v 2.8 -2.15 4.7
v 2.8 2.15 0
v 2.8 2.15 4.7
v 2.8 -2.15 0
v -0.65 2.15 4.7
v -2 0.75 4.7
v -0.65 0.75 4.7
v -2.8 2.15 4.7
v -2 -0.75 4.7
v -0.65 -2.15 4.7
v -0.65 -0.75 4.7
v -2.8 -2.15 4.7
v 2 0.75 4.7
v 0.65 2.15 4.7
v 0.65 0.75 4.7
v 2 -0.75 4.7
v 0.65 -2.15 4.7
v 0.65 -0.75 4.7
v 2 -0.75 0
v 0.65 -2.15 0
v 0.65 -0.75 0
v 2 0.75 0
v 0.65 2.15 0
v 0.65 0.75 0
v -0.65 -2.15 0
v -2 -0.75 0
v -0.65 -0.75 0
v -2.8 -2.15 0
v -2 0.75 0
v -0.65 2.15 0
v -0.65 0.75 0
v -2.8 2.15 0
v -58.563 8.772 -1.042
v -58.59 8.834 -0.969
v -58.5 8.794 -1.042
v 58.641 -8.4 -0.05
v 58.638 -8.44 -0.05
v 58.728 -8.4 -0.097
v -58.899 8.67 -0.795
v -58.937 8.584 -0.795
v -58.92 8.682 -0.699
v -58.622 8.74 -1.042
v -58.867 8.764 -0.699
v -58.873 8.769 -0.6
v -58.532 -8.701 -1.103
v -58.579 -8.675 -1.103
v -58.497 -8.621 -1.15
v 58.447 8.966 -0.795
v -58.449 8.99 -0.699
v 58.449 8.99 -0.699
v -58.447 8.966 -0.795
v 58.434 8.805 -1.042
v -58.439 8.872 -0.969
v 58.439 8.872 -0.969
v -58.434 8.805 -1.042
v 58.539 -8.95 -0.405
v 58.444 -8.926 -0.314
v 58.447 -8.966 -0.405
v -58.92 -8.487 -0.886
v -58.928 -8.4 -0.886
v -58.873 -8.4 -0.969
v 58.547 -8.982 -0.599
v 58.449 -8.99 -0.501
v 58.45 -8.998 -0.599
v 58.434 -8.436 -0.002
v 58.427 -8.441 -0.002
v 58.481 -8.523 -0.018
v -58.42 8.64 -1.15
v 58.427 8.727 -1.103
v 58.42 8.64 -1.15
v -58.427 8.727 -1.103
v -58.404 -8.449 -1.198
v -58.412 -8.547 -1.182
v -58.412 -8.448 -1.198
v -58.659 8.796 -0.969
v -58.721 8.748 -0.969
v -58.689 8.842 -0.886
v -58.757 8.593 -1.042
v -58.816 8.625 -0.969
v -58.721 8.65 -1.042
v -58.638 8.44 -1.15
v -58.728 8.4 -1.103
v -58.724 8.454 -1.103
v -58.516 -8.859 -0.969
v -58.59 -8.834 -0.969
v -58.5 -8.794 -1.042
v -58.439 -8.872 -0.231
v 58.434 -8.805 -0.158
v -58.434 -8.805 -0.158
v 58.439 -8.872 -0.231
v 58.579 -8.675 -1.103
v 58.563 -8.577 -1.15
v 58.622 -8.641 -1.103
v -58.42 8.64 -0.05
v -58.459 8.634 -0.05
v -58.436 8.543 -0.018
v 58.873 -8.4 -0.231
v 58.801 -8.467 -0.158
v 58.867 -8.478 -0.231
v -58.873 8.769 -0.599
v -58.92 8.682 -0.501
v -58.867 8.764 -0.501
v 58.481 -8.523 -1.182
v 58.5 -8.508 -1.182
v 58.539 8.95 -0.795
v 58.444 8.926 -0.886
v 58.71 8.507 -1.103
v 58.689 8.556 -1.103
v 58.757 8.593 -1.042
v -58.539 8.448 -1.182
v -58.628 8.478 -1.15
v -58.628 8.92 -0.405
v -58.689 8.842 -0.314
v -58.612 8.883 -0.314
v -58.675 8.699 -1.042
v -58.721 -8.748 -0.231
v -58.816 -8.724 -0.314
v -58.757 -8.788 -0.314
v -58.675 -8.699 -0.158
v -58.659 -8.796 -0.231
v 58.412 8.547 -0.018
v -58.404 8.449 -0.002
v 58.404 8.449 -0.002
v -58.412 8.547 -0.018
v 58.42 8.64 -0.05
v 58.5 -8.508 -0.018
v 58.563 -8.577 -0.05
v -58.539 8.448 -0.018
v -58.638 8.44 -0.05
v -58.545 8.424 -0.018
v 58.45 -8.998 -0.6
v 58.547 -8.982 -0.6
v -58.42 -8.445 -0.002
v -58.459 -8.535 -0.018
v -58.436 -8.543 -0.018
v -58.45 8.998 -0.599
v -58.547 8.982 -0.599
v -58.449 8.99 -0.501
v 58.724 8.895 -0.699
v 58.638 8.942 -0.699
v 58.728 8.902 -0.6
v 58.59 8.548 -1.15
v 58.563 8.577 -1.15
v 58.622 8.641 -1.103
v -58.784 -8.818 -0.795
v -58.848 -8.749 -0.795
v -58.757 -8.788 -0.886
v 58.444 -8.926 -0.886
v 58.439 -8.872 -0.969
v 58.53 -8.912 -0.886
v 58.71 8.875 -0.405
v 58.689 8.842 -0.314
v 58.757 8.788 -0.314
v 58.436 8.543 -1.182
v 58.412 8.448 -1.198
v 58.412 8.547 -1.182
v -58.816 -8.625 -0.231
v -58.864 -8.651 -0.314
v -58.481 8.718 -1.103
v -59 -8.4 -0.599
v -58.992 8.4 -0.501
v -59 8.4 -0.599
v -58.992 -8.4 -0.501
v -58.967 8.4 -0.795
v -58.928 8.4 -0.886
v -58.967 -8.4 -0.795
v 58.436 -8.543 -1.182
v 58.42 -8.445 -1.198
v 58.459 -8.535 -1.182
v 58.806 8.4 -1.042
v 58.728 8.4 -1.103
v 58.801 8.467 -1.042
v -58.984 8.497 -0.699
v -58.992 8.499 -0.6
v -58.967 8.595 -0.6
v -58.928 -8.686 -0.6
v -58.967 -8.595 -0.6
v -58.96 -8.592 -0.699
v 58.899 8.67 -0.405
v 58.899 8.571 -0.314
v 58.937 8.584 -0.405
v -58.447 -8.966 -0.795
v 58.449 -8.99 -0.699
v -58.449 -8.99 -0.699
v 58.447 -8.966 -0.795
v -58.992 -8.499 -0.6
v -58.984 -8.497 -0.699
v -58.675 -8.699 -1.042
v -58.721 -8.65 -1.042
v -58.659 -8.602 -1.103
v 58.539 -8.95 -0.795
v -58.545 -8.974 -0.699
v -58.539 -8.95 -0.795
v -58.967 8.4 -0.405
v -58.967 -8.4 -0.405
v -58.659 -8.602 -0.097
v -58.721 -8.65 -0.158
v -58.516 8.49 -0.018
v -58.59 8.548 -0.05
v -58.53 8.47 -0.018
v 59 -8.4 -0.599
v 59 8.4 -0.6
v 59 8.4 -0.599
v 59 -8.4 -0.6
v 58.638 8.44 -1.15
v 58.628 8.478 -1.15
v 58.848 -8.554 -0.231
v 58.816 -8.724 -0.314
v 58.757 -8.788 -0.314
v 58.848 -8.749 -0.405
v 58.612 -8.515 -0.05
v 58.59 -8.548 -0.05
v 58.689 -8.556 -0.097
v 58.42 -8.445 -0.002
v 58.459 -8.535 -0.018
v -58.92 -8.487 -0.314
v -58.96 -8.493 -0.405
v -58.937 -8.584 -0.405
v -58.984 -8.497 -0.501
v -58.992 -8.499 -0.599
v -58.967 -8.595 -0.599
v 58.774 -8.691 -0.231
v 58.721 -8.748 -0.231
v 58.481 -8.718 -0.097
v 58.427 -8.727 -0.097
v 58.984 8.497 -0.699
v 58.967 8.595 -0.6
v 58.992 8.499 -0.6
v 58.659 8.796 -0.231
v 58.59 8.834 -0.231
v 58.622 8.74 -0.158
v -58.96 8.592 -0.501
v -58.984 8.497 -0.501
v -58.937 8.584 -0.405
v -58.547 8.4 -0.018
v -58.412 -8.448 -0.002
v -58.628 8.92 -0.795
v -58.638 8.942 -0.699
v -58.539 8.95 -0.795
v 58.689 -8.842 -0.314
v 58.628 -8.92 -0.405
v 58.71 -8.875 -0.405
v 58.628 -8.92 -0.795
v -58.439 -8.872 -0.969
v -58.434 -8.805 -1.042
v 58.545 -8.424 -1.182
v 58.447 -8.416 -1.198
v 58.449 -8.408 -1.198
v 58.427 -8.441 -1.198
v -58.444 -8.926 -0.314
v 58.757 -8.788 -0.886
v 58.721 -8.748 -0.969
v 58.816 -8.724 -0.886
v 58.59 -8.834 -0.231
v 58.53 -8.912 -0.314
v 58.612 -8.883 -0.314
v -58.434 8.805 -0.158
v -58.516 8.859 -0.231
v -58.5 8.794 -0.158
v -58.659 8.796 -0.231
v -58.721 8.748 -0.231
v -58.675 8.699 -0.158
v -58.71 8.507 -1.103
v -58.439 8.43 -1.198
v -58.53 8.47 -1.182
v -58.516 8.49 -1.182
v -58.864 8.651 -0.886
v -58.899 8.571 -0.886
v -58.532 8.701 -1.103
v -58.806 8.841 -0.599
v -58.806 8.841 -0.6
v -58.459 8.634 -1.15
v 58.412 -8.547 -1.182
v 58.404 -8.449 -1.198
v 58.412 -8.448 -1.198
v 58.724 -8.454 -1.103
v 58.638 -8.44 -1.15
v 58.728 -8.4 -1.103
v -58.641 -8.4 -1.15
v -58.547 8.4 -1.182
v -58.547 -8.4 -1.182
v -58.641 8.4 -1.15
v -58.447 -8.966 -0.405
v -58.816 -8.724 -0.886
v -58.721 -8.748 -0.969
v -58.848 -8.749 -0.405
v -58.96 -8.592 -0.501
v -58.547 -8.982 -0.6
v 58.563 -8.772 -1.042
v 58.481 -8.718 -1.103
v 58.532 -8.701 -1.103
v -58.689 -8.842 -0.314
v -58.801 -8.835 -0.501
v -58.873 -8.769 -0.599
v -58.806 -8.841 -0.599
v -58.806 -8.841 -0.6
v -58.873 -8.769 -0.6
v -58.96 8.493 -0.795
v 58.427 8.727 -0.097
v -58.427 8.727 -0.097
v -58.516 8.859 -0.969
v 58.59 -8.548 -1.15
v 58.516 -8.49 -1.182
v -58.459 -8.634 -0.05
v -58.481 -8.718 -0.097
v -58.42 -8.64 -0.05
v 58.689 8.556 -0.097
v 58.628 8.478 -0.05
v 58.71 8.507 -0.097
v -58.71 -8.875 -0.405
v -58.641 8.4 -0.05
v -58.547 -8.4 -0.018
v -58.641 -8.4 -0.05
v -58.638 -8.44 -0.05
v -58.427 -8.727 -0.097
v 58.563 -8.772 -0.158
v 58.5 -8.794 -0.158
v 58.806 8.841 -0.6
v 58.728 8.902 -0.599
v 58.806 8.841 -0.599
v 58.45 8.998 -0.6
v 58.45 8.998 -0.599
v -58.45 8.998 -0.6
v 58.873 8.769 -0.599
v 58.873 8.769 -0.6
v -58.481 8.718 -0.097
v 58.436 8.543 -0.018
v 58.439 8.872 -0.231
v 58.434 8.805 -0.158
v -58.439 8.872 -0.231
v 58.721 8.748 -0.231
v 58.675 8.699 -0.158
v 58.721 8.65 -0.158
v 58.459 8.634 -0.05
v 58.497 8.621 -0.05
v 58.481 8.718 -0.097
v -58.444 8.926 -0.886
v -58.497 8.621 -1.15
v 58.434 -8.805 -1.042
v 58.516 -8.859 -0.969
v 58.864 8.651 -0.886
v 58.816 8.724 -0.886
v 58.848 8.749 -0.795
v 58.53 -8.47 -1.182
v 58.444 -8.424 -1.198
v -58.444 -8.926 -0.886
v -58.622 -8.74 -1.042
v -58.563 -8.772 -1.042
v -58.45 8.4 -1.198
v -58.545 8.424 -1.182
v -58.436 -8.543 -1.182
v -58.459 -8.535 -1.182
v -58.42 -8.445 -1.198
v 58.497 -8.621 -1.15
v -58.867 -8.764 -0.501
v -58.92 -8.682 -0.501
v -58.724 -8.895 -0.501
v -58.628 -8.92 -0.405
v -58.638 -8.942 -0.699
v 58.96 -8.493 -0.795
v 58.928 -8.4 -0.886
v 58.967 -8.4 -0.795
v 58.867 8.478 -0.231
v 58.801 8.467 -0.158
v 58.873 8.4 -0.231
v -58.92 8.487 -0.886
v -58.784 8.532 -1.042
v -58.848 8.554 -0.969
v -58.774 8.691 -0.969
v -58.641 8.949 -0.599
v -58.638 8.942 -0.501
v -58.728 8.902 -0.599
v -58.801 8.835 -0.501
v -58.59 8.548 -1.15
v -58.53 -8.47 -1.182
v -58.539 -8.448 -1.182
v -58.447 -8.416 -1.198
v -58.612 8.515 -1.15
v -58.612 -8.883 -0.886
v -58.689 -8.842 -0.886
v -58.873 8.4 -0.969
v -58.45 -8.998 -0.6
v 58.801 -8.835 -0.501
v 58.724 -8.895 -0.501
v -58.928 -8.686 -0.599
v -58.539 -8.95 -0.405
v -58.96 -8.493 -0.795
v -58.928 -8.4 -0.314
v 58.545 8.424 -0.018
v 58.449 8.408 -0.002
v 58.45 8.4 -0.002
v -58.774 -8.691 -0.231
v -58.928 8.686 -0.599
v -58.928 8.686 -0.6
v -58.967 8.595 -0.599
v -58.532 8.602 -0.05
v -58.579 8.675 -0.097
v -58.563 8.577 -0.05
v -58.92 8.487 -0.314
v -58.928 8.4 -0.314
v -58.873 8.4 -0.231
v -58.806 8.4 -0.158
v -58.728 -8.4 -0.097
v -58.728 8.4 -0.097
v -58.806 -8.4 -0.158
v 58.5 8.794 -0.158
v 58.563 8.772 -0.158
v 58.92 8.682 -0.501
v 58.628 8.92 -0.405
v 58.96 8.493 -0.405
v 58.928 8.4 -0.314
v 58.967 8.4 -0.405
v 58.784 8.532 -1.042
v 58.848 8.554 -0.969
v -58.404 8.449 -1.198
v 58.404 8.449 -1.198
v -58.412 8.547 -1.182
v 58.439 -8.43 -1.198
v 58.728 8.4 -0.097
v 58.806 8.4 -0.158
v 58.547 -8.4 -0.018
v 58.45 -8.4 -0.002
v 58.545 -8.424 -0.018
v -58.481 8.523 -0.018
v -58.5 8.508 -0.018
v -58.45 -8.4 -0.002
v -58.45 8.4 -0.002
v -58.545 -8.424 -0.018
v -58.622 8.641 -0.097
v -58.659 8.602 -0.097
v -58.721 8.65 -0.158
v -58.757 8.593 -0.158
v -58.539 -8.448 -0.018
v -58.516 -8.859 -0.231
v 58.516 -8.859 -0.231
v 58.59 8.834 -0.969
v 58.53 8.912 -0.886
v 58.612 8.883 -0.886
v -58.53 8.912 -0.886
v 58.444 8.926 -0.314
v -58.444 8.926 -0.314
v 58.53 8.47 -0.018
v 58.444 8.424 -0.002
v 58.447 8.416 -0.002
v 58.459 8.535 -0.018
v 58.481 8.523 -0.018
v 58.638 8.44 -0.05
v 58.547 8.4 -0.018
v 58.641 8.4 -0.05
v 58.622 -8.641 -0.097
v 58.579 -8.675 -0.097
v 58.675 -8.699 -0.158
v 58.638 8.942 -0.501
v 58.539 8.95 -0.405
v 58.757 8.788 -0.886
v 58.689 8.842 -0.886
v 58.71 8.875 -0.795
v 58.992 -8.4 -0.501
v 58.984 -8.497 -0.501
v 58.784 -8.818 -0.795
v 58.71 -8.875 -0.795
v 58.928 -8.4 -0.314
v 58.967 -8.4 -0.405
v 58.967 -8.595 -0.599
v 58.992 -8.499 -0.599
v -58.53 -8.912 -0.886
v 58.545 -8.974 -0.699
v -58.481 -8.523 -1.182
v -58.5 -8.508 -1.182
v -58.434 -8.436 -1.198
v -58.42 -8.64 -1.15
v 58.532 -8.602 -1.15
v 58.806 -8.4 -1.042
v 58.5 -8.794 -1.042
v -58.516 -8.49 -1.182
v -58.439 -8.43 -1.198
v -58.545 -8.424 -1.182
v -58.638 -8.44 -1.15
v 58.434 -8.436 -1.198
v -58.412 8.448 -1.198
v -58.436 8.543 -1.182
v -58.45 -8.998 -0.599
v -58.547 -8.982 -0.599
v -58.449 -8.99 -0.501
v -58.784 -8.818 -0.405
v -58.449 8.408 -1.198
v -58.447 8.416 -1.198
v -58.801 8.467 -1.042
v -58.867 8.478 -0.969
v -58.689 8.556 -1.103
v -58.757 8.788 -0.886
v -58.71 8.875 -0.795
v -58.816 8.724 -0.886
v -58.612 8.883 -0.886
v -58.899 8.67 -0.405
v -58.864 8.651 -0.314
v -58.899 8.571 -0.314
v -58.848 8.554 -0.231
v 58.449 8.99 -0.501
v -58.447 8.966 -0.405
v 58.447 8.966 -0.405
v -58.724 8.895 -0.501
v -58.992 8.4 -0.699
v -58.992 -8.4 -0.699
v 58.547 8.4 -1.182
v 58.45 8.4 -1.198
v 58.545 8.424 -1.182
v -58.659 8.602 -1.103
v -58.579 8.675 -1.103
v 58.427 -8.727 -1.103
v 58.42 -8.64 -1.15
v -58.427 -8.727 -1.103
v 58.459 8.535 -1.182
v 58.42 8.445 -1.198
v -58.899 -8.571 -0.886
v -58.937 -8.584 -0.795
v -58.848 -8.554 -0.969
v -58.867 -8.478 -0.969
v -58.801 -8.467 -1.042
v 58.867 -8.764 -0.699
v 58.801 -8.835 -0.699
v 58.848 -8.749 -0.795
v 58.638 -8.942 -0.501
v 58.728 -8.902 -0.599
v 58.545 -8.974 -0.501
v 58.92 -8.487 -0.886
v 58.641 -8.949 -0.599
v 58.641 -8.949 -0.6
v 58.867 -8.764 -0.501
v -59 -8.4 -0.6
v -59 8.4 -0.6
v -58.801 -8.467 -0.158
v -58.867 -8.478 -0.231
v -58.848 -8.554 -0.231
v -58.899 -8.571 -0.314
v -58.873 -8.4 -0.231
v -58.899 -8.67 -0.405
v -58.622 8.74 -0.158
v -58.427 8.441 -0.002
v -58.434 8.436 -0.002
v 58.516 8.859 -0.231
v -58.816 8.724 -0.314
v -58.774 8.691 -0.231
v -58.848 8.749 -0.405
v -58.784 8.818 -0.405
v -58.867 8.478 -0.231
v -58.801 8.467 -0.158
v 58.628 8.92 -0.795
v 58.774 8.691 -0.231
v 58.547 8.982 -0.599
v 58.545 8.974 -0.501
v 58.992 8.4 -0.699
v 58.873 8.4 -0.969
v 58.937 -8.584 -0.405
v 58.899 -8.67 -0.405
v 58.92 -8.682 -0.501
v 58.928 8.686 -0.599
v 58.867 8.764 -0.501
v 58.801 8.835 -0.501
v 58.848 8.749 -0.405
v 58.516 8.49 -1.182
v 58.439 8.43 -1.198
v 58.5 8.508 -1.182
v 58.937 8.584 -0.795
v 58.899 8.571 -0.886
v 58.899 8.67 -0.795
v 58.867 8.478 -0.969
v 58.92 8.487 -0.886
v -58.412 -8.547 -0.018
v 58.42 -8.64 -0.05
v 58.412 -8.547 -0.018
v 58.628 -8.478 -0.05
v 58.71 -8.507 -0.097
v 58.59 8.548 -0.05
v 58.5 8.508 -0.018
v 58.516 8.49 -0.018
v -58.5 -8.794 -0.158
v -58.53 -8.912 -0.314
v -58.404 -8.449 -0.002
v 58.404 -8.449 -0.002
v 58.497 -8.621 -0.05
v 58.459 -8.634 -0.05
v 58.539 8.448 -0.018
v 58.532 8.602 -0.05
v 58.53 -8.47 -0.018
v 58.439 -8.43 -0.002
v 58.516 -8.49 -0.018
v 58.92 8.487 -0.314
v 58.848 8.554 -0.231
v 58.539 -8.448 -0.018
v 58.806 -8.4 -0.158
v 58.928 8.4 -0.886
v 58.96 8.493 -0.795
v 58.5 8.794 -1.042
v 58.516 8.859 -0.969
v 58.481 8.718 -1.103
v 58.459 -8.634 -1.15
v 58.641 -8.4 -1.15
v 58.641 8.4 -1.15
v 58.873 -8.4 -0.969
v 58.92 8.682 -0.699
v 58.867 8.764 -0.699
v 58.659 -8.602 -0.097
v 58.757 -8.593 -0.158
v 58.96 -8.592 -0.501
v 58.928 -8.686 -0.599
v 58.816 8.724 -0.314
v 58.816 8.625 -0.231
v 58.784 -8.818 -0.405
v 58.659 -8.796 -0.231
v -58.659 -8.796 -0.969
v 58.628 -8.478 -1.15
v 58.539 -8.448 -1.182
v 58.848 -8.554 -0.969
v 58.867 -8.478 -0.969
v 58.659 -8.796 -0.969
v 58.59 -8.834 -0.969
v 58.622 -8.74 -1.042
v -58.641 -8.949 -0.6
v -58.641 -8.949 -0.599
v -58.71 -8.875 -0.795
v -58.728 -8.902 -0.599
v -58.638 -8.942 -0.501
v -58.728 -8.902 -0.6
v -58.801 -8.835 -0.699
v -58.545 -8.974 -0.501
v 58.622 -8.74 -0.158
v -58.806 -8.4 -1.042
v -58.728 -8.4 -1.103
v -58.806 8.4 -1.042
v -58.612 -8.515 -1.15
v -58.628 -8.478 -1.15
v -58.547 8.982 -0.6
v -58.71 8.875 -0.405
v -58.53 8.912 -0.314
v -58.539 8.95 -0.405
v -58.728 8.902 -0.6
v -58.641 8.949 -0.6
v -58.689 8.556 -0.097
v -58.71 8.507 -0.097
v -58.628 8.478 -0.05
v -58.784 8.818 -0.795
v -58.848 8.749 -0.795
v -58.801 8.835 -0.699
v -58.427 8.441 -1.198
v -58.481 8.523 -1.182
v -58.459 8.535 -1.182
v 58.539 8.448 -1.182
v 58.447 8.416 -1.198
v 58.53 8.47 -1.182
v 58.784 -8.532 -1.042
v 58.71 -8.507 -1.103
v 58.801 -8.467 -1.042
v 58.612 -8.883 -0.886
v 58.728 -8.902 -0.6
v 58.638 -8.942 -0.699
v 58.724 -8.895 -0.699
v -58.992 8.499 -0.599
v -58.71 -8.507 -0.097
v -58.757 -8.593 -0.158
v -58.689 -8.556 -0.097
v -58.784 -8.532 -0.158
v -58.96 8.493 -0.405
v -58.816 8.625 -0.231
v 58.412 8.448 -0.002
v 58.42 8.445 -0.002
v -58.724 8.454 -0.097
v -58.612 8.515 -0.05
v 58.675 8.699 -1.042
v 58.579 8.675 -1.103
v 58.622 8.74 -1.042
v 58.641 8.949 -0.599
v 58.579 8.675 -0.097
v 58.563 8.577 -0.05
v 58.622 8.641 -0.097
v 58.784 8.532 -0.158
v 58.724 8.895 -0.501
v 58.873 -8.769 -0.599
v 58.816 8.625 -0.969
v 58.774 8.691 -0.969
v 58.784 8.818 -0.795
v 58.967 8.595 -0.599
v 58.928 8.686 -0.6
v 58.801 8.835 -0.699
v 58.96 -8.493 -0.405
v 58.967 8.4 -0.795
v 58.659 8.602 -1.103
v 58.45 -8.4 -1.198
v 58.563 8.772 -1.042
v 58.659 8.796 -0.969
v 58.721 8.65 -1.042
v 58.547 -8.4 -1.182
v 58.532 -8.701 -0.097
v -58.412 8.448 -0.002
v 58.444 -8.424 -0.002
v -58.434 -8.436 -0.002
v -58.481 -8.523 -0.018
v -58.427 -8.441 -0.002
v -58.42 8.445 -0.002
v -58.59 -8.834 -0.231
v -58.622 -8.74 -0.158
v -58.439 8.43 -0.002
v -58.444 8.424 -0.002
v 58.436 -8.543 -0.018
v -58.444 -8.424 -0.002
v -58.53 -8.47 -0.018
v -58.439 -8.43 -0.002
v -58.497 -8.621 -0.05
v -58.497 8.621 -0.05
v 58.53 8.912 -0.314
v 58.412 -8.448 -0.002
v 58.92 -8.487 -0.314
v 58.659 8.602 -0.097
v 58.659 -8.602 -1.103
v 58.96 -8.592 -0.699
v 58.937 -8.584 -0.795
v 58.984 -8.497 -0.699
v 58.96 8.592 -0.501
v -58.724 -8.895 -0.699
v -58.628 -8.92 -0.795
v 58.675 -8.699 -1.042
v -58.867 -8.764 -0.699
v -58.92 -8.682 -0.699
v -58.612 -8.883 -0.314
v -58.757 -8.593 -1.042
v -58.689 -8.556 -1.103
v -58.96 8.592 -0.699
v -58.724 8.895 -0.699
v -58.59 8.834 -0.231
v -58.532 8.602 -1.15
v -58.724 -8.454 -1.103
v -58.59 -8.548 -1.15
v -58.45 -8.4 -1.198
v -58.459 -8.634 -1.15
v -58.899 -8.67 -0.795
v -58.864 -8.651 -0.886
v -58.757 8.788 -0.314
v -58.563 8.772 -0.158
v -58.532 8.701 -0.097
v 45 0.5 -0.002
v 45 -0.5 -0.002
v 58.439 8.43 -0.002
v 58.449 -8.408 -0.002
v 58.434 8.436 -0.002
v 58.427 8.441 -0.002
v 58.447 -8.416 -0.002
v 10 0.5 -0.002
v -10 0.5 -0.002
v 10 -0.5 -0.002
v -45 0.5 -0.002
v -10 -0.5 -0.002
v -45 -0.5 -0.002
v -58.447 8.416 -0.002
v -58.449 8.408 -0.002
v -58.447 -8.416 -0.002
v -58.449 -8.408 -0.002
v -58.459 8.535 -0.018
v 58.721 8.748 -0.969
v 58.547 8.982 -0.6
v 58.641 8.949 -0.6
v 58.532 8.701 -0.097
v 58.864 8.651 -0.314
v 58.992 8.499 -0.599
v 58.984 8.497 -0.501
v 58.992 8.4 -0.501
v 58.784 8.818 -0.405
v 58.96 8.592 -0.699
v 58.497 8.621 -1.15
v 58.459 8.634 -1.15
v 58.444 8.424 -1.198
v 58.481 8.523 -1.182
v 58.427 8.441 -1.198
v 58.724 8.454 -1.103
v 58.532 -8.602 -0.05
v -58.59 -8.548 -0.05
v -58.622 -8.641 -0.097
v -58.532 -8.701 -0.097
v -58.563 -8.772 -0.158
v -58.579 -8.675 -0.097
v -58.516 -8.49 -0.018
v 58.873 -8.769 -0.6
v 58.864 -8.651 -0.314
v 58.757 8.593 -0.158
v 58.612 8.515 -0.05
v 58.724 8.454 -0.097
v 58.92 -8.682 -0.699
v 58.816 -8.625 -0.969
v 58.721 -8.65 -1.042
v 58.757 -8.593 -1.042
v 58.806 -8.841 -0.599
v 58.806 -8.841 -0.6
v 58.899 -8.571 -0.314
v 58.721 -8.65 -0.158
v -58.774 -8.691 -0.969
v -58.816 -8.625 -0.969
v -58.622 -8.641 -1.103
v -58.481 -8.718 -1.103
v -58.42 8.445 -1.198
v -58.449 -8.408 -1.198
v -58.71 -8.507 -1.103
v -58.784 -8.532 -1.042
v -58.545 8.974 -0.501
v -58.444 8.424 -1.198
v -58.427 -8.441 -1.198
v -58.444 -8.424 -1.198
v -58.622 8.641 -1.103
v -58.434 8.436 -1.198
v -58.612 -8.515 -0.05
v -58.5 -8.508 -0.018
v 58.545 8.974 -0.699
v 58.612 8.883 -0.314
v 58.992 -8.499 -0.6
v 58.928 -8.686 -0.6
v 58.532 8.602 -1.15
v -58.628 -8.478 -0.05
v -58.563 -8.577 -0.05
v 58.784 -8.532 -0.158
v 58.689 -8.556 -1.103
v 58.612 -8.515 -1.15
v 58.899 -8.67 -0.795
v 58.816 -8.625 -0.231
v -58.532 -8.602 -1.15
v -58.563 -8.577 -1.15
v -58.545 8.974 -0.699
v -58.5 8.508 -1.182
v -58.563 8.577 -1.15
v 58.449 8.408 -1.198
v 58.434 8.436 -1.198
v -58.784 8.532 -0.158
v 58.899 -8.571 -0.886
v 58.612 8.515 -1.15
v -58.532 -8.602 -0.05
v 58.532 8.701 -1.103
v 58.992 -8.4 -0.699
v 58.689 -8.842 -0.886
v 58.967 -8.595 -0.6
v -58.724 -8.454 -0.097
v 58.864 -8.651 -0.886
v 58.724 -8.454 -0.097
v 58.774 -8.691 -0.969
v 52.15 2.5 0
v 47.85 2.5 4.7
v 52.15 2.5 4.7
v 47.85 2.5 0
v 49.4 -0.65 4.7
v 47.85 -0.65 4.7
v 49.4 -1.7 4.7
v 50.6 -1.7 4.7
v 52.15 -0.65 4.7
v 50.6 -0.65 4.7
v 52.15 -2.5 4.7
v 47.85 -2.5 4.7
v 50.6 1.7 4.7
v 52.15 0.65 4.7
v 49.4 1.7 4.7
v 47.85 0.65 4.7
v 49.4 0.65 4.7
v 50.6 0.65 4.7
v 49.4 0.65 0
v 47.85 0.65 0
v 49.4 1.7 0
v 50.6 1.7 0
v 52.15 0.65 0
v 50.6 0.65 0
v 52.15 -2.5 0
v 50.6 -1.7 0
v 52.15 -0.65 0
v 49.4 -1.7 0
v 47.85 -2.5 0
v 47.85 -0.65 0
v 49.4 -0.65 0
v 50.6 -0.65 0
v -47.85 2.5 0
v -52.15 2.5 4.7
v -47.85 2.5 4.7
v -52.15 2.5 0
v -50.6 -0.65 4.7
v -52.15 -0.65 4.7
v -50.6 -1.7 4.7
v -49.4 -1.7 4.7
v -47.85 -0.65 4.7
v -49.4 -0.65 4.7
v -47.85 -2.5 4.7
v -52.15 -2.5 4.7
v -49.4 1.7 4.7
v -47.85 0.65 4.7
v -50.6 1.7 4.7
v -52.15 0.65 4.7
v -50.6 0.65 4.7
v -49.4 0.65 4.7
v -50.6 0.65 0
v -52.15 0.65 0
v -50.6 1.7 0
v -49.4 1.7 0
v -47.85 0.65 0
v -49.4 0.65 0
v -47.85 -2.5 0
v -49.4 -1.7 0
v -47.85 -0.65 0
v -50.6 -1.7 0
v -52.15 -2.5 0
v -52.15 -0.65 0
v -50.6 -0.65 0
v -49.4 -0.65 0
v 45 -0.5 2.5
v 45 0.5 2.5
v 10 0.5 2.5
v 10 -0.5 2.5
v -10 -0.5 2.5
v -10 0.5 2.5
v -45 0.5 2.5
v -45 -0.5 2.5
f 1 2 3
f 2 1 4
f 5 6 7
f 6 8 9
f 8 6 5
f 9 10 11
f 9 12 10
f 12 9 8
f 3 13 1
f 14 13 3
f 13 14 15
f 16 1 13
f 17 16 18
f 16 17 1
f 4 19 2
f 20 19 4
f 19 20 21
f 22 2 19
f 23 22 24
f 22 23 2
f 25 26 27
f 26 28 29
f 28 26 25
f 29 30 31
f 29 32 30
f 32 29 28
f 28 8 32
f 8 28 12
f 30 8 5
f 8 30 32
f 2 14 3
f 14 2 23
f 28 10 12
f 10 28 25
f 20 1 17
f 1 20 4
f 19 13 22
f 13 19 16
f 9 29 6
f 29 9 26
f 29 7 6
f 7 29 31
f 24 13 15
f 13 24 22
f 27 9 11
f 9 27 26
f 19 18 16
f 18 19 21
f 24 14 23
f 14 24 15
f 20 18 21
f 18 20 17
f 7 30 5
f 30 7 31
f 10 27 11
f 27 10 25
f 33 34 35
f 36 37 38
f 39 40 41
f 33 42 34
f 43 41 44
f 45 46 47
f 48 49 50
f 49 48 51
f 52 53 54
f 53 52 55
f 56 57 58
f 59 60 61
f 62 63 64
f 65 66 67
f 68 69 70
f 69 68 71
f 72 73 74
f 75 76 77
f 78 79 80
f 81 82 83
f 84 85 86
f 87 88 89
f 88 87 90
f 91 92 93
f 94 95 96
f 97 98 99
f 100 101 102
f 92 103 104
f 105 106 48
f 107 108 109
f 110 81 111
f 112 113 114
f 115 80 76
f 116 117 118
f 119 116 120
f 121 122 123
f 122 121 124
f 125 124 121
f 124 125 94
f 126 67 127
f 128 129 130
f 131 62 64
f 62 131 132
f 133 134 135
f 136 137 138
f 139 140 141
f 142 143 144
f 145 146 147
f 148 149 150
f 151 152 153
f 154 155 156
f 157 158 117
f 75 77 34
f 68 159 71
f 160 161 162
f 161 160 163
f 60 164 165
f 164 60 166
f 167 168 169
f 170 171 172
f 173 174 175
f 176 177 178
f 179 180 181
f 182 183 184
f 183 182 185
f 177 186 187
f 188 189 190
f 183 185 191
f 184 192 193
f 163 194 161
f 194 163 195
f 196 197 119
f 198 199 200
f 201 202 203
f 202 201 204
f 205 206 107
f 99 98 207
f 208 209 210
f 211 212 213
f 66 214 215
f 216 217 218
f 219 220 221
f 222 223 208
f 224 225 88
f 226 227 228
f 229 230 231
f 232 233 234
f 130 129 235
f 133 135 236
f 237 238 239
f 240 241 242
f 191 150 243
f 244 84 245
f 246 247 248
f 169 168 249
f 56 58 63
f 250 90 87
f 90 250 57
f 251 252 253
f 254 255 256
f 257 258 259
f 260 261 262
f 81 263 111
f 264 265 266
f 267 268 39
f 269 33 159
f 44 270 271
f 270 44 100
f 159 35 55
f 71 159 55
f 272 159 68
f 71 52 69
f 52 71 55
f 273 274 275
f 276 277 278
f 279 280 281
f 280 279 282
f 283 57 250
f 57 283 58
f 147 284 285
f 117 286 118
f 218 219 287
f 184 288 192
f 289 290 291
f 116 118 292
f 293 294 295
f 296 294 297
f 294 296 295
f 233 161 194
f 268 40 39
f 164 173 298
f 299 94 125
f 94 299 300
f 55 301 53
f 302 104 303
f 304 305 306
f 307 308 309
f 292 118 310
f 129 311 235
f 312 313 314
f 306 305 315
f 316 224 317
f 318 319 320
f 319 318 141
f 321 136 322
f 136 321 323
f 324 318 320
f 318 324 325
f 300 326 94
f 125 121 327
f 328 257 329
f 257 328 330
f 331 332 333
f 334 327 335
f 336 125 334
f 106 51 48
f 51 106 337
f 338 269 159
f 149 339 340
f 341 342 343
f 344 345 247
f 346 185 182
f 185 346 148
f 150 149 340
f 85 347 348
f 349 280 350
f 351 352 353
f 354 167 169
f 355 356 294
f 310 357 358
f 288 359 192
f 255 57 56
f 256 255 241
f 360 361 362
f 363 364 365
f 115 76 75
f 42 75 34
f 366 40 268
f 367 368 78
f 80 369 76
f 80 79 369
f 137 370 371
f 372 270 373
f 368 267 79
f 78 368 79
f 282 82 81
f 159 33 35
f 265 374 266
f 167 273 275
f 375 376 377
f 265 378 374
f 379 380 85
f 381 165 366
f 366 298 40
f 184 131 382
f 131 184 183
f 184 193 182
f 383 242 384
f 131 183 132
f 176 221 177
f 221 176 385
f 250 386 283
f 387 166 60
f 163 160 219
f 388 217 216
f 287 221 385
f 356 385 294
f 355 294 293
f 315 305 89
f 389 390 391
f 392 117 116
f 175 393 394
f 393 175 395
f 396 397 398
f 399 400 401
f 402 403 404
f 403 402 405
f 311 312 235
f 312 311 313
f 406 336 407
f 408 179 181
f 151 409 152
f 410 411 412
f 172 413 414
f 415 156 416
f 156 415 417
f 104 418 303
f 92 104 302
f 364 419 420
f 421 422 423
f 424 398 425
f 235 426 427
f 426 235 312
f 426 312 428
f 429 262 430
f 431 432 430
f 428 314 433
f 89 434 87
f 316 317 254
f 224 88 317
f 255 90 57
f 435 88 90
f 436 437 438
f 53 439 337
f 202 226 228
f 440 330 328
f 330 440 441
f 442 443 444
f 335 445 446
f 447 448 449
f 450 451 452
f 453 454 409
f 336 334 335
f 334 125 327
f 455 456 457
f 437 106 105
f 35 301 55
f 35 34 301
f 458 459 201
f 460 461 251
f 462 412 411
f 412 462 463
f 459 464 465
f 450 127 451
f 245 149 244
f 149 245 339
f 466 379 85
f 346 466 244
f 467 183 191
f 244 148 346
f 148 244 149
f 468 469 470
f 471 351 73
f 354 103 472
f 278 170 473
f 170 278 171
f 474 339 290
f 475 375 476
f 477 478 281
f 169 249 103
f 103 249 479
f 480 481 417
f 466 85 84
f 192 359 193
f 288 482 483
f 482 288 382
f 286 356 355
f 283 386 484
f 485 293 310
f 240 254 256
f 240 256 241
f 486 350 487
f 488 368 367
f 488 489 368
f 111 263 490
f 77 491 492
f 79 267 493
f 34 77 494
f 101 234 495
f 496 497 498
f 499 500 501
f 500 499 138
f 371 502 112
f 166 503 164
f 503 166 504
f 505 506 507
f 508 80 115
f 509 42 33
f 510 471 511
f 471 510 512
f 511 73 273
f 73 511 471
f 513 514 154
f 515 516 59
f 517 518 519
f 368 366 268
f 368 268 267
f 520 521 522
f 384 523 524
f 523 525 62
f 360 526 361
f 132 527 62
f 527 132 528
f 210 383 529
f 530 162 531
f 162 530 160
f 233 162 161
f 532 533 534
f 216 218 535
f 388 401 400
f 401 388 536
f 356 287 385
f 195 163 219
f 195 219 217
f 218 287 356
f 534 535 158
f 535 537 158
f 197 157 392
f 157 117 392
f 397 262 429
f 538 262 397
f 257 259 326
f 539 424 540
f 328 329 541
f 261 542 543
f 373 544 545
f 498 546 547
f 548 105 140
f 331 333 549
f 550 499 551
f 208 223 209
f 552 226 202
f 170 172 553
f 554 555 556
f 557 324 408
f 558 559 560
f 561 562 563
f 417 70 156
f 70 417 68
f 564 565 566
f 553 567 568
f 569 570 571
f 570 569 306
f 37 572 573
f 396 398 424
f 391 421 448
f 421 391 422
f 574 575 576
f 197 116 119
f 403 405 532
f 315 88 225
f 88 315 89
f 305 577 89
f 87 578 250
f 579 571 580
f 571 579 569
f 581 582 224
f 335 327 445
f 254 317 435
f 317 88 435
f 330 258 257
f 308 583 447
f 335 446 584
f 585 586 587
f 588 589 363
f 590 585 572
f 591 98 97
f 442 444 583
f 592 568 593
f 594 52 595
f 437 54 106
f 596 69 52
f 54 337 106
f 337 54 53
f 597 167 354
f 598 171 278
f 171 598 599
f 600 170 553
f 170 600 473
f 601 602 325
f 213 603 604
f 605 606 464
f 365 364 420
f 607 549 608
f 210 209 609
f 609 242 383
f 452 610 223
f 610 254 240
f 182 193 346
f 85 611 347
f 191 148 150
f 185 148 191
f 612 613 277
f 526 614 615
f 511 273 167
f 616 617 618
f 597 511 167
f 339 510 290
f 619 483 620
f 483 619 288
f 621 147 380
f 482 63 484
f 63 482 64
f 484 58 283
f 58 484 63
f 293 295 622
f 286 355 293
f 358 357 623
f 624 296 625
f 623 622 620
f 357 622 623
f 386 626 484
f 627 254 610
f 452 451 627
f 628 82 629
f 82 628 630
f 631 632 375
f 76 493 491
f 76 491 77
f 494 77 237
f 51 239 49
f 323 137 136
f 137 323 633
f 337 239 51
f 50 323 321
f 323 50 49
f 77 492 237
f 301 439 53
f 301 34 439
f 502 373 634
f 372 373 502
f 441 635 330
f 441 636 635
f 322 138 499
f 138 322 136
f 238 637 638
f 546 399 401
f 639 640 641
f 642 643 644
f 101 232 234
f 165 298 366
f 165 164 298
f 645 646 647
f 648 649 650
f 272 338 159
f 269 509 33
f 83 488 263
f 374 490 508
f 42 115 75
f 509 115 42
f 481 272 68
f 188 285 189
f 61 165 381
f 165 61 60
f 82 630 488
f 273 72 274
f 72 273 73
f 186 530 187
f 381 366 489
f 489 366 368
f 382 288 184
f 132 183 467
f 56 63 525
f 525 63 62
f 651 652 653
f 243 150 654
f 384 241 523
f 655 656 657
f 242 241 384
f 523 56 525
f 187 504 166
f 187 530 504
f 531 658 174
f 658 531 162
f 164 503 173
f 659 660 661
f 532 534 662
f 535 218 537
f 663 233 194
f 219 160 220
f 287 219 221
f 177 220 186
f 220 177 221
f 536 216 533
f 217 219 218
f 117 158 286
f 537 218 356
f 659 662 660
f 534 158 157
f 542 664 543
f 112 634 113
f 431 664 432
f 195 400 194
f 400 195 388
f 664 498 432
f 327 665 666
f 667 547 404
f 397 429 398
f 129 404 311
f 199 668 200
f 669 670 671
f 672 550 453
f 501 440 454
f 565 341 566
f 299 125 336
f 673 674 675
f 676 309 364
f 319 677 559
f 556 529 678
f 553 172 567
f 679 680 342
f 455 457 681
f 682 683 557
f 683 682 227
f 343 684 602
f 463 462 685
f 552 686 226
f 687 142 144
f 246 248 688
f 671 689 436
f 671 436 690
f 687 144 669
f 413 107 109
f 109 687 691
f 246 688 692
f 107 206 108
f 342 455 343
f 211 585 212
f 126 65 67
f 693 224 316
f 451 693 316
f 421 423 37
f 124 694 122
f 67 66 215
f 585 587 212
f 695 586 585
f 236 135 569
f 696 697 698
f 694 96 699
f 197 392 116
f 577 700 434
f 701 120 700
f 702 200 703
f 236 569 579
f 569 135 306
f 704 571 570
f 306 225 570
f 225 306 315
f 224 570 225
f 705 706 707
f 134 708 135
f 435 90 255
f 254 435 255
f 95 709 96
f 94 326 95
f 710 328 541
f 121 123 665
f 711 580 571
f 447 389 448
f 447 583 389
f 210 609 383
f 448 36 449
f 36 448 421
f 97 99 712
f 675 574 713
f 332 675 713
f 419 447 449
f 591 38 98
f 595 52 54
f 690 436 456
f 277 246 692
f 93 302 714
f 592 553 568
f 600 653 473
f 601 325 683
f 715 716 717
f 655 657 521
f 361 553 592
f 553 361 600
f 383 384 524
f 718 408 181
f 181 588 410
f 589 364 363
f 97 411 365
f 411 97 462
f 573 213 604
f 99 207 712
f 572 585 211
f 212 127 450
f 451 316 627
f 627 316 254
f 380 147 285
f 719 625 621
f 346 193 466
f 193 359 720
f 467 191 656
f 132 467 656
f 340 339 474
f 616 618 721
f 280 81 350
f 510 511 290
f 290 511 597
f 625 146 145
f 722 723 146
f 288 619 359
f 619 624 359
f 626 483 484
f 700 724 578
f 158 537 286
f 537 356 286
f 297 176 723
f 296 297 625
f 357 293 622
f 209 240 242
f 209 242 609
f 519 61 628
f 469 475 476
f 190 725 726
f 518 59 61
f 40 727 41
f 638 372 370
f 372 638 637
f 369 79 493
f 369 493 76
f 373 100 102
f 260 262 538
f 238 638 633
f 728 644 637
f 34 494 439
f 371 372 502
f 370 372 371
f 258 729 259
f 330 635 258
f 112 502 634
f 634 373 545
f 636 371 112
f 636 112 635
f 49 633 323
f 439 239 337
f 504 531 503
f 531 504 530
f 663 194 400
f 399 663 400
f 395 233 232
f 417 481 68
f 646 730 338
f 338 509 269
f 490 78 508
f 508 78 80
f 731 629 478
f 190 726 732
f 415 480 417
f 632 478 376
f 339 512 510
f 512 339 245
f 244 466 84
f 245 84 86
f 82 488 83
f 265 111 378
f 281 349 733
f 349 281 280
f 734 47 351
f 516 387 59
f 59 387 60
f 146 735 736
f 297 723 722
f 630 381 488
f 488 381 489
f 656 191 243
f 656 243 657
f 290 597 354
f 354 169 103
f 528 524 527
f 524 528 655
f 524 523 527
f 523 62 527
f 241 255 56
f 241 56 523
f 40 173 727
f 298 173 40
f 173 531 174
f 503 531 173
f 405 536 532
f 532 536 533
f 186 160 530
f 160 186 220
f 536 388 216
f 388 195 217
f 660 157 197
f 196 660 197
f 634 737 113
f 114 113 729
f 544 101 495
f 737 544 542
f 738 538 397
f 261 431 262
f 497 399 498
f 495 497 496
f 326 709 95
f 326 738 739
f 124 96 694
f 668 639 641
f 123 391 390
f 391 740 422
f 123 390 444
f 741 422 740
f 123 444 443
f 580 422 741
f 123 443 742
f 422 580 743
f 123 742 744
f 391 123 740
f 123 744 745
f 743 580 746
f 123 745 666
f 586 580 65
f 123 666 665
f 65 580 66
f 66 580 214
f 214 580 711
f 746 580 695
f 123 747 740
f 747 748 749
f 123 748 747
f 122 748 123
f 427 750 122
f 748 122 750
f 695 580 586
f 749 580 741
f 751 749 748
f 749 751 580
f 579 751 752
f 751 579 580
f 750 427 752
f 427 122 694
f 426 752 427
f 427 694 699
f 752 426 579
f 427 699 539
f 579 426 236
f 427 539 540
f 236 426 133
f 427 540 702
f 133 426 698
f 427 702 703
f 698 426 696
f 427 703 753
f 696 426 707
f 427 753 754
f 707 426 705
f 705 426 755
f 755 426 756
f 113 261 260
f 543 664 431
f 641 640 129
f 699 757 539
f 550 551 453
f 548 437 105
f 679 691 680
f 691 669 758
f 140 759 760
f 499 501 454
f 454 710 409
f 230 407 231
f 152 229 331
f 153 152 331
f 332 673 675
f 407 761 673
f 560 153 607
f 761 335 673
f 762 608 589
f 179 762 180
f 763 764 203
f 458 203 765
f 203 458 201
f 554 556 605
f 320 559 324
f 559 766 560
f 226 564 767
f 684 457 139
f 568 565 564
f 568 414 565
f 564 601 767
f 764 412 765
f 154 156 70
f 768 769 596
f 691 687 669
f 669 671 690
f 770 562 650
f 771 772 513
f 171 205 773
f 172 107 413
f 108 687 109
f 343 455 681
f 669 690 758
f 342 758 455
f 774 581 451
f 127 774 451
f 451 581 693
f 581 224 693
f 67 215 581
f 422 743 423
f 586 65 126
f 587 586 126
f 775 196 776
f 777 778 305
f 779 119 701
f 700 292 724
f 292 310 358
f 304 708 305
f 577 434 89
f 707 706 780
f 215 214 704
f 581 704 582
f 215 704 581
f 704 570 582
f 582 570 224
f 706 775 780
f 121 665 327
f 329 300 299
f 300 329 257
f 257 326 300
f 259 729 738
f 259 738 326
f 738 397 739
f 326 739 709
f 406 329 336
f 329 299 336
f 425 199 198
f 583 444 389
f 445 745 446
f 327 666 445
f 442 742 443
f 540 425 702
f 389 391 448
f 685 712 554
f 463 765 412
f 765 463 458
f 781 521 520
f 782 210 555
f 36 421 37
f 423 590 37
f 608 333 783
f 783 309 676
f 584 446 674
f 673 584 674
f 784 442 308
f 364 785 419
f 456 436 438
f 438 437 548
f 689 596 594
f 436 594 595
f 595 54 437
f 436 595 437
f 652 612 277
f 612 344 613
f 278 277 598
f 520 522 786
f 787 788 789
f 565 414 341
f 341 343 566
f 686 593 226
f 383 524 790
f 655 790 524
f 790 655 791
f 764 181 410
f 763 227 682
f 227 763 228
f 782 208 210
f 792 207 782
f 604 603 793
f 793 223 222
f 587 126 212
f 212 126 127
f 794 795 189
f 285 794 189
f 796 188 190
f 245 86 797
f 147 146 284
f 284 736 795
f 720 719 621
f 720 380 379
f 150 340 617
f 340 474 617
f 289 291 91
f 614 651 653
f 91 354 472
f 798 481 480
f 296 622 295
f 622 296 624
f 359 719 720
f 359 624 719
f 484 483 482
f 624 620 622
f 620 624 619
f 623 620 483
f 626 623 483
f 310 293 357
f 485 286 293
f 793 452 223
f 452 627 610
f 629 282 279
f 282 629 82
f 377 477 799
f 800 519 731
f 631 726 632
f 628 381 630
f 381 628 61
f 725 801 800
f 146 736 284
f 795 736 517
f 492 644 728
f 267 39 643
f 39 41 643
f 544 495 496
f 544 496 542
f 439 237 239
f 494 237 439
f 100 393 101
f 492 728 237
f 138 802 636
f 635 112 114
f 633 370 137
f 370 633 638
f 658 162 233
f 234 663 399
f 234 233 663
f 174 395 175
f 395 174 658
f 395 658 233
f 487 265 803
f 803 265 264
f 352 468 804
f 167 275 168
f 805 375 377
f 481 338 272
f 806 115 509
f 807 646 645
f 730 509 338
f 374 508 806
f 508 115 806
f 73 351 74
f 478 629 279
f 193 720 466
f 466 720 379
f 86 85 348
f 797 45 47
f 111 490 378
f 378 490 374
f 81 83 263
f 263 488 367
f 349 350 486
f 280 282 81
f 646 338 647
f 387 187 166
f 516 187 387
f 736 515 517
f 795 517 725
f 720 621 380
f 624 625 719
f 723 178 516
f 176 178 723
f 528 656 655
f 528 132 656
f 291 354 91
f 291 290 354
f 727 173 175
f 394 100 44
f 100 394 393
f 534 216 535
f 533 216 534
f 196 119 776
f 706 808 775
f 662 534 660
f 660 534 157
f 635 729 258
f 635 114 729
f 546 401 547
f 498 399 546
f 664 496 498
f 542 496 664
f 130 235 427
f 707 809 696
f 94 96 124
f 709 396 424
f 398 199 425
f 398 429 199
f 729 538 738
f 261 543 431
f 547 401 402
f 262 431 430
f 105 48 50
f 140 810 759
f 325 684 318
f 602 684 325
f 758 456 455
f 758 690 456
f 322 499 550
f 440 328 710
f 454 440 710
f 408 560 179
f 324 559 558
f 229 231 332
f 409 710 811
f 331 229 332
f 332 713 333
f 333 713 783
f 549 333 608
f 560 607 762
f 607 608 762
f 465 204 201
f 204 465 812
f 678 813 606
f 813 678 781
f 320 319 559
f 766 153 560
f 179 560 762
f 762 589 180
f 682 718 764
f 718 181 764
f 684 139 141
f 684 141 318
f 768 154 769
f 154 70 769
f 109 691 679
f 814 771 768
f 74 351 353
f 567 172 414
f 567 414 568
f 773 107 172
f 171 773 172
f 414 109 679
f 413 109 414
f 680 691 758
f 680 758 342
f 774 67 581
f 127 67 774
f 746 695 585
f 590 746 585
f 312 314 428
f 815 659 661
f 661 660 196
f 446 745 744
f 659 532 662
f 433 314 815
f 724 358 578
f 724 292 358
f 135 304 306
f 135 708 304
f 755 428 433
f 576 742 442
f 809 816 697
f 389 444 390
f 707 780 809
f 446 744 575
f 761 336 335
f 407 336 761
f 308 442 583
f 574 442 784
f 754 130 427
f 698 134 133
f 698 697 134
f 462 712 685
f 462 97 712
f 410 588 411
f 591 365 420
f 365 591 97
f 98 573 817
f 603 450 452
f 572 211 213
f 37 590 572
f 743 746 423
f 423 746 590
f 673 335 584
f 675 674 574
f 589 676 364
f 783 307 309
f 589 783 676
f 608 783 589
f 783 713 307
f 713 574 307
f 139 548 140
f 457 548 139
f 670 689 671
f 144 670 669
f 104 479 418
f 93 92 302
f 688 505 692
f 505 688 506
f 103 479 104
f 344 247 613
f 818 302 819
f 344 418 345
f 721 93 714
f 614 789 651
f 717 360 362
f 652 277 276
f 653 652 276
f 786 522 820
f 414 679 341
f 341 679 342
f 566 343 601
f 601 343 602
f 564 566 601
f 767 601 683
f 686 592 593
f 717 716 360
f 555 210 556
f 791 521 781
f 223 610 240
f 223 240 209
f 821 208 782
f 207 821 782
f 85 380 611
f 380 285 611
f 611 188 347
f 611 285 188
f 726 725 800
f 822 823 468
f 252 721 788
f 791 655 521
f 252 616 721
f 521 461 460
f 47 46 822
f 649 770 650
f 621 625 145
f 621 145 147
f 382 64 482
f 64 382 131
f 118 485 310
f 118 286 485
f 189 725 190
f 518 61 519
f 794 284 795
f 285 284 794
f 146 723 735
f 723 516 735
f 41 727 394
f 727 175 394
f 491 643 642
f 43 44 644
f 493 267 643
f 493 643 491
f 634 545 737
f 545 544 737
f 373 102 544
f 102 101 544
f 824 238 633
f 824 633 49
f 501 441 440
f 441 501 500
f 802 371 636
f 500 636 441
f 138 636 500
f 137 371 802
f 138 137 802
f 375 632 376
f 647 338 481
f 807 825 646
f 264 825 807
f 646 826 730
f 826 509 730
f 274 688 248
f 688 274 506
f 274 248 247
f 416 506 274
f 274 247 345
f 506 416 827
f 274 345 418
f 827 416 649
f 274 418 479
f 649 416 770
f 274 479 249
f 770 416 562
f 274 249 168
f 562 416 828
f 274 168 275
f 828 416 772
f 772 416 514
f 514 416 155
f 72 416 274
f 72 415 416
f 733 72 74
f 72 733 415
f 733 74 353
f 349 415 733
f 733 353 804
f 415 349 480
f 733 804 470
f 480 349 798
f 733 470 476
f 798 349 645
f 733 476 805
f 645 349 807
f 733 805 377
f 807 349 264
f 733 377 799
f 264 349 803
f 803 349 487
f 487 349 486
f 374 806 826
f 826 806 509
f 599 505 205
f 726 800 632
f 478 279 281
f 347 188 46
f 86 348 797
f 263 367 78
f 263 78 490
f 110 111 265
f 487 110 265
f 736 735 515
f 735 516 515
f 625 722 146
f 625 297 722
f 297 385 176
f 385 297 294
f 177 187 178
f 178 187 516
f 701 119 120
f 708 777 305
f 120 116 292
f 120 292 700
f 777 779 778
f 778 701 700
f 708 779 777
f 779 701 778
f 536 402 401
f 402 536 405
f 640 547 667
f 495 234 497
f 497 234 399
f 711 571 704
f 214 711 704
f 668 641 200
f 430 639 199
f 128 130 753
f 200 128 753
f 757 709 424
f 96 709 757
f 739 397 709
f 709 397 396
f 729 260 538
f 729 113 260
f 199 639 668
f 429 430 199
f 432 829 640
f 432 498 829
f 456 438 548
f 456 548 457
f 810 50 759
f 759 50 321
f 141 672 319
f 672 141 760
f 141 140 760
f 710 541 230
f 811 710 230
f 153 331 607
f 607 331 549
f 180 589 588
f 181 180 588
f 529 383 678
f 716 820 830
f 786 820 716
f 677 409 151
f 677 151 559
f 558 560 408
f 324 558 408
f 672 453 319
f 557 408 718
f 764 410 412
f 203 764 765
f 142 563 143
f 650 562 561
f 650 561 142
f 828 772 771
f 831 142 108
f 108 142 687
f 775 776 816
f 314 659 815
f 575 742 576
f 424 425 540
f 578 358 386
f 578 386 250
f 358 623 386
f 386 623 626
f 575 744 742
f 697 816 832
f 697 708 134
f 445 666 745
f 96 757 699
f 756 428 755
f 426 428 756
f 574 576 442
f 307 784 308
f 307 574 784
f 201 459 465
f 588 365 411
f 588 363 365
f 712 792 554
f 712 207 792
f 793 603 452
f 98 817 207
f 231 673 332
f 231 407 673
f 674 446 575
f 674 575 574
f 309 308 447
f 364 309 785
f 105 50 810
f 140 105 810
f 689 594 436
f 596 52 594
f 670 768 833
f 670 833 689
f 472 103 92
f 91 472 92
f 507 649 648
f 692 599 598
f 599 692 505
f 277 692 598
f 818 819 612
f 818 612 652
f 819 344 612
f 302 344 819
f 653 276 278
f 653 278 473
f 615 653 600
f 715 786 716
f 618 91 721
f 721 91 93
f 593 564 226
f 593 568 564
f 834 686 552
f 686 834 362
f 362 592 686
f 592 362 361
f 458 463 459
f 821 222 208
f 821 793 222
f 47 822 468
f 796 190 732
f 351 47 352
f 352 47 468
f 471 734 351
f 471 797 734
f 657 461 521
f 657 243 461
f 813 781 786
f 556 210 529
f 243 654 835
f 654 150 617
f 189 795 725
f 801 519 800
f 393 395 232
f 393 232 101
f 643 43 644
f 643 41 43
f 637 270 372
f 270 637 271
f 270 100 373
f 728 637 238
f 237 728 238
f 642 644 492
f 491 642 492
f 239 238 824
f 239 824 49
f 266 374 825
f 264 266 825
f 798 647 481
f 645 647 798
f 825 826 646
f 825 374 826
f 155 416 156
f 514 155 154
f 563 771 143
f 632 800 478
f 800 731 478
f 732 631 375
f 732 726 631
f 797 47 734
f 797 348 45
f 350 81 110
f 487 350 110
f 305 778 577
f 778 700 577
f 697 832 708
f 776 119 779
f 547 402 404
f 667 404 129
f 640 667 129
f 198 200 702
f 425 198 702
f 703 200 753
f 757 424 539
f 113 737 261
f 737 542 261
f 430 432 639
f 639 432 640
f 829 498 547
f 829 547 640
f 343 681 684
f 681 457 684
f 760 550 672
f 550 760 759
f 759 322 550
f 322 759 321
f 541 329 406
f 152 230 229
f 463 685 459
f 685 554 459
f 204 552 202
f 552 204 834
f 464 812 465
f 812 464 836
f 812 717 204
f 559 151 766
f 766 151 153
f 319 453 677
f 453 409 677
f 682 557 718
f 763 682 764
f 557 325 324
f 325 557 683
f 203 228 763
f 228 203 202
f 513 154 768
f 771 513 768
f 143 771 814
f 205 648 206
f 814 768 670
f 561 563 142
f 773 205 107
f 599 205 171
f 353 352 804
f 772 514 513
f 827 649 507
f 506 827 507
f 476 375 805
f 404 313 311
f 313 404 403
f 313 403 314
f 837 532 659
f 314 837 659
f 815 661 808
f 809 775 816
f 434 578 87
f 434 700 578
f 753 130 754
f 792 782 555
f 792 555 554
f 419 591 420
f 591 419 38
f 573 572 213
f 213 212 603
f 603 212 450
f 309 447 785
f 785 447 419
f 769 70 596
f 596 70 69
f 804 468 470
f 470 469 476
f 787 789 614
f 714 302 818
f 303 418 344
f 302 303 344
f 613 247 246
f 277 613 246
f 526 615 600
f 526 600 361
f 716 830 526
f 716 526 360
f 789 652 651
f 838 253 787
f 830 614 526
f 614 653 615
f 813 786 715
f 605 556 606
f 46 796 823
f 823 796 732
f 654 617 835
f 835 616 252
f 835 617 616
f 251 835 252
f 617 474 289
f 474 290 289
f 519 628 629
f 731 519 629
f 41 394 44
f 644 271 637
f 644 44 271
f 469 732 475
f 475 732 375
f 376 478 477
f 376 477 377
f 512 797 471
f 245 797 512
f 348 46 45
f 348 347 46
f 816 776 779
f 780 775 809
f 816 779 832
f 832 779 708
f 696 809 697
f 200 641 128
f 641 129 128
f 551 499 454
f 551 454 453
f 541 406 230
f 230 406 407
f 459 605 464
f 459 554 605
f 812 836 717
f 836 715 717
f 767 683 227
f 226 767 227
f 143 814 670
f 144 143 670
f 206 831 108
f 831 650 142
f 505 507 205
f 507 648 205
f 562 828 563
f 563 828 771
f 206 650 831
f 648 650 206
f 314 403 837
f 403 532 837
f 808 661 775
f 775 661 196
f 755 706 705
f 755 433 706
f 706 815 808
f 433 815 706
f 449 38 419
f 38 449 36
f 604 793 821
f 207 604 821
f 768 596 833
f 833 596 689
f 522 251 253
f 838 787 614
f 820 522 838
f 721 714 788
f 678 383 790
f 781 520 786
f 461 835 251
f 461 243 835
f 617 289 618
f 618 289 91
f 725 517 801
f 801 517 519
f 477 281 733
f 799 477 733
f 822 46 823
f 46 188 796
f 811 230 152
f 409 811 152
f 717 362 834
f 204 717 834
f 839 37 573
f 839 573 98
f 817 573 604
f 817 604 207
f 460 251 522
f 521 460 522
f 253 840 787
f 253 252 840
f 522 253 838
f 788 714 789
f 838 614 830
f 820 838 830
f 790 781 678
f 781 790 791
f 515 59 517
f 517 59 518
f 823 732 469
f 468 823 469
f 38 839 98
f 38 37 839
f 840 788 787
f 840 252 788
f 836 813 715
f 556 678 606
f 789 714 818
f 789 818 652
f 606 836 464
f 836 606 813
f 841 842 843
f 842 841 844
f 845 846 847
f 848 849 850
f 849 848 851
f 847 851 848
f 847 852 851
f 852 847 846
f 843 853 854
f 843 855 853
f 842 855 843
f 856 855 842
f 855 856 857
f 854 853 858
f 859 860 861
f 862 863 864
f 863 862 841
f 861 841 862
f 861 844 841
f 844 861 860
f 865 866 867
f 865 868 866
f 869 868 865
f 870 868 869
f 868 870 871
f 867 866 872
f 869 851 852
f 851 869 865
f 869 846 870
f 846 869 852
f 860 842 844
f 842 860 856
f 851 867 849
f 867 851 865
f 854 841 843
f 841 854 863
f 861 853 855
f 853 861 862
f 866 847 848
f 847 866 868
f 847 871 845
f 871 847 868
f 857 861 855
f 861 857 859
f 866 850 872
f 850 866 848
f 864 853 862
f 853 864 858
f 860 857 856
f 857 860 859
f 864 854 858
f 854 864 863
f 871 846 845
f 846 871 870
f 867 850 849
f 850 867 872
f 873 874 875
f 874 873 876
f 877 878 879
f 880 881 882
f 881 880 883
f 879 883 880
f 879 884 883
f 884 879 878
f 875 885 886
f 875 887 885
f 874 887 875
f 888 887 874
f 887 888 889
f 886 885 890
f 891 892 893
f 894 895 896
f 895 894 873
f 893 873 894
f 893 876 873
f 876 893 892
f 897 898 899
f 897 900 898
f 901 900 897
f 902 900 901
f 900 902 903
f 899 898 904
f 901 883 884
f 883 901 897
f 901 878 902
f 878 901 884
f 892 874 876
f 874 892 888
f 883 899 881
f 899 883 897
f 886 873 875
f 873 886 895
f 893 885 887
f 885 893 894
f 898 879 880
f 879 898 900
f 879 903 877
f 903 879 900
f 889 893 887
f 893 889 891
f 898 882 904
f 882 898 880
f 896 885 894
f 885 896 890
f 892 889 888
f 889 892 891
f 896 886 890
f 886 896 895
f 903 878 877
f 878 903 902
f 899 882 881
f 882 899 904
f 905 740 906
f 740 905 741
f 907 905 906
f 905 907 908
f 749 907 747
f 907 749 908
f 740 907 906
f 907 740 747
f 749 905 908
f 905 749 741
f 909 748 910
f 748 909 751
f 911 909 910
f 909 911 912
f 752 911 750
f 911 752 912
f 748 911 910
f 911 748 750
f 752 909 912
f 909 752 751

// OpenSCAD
u = 18;

module stem(){
    h = 4.7;
    
    translate([0, 0, h/2]) difference(){
        cube([5.6, 4.3, h], center=true);
        cube([4.0, 1.5, h*2], center=true);
        cube([1.3, 5.0, h*2], center=true);
    }
}

module stem_stabiliser(){
    h = 4.7;
    
    rotate([0, 0, 90]) translate([0, 0, h/2]) difference(){
        cube([5.0, 4.3, h], center=true);
        cube([3.4, 1.2, h*2], center=true);
        cube([1.3, 5.0, h*2], center=true);
    }
}

module plate(x=18){
    r = 0.6;
    $fa = 0.1;
    $fs = 0.1;
    
    translate([0, 0, -r]) minkowski(){
        sphere(r);
        cube([x - 2*r, 18 - 2*r, 0.001], center=true);
    }
}

module keycap(width){
    plate(width);
    stem();
}

module keycap_2u(){
    keycap(2 * u);
    translate([12, 0, 0]) stem_stabiliser();
    translate([-12, 0, 0]) stem_stabiliser();
}

module keycap_2_25u(){
    keycap(2.25 * u);
    translate([12, 0, 0]) stem_stabiliser();
    translate([-12, 0, 0]) stem_stabiliser();
}

module keycap_space(){
    keycap(118);
    translate([50, 0, 0]) stem_stabiliser();
    translate([-50, 0, 0]) stem_stabiliser();
    translate([10 + 35/2, 0, 1]) cube([35, 1, 3], center=true);
    translate([-10 - 35/2, 0, 1]) cube([35, 1, 3], center=true);
}

//keycap(1 * u);
//keycap_2_25u();
//keycap(1.75 * u);
keycap_space();
